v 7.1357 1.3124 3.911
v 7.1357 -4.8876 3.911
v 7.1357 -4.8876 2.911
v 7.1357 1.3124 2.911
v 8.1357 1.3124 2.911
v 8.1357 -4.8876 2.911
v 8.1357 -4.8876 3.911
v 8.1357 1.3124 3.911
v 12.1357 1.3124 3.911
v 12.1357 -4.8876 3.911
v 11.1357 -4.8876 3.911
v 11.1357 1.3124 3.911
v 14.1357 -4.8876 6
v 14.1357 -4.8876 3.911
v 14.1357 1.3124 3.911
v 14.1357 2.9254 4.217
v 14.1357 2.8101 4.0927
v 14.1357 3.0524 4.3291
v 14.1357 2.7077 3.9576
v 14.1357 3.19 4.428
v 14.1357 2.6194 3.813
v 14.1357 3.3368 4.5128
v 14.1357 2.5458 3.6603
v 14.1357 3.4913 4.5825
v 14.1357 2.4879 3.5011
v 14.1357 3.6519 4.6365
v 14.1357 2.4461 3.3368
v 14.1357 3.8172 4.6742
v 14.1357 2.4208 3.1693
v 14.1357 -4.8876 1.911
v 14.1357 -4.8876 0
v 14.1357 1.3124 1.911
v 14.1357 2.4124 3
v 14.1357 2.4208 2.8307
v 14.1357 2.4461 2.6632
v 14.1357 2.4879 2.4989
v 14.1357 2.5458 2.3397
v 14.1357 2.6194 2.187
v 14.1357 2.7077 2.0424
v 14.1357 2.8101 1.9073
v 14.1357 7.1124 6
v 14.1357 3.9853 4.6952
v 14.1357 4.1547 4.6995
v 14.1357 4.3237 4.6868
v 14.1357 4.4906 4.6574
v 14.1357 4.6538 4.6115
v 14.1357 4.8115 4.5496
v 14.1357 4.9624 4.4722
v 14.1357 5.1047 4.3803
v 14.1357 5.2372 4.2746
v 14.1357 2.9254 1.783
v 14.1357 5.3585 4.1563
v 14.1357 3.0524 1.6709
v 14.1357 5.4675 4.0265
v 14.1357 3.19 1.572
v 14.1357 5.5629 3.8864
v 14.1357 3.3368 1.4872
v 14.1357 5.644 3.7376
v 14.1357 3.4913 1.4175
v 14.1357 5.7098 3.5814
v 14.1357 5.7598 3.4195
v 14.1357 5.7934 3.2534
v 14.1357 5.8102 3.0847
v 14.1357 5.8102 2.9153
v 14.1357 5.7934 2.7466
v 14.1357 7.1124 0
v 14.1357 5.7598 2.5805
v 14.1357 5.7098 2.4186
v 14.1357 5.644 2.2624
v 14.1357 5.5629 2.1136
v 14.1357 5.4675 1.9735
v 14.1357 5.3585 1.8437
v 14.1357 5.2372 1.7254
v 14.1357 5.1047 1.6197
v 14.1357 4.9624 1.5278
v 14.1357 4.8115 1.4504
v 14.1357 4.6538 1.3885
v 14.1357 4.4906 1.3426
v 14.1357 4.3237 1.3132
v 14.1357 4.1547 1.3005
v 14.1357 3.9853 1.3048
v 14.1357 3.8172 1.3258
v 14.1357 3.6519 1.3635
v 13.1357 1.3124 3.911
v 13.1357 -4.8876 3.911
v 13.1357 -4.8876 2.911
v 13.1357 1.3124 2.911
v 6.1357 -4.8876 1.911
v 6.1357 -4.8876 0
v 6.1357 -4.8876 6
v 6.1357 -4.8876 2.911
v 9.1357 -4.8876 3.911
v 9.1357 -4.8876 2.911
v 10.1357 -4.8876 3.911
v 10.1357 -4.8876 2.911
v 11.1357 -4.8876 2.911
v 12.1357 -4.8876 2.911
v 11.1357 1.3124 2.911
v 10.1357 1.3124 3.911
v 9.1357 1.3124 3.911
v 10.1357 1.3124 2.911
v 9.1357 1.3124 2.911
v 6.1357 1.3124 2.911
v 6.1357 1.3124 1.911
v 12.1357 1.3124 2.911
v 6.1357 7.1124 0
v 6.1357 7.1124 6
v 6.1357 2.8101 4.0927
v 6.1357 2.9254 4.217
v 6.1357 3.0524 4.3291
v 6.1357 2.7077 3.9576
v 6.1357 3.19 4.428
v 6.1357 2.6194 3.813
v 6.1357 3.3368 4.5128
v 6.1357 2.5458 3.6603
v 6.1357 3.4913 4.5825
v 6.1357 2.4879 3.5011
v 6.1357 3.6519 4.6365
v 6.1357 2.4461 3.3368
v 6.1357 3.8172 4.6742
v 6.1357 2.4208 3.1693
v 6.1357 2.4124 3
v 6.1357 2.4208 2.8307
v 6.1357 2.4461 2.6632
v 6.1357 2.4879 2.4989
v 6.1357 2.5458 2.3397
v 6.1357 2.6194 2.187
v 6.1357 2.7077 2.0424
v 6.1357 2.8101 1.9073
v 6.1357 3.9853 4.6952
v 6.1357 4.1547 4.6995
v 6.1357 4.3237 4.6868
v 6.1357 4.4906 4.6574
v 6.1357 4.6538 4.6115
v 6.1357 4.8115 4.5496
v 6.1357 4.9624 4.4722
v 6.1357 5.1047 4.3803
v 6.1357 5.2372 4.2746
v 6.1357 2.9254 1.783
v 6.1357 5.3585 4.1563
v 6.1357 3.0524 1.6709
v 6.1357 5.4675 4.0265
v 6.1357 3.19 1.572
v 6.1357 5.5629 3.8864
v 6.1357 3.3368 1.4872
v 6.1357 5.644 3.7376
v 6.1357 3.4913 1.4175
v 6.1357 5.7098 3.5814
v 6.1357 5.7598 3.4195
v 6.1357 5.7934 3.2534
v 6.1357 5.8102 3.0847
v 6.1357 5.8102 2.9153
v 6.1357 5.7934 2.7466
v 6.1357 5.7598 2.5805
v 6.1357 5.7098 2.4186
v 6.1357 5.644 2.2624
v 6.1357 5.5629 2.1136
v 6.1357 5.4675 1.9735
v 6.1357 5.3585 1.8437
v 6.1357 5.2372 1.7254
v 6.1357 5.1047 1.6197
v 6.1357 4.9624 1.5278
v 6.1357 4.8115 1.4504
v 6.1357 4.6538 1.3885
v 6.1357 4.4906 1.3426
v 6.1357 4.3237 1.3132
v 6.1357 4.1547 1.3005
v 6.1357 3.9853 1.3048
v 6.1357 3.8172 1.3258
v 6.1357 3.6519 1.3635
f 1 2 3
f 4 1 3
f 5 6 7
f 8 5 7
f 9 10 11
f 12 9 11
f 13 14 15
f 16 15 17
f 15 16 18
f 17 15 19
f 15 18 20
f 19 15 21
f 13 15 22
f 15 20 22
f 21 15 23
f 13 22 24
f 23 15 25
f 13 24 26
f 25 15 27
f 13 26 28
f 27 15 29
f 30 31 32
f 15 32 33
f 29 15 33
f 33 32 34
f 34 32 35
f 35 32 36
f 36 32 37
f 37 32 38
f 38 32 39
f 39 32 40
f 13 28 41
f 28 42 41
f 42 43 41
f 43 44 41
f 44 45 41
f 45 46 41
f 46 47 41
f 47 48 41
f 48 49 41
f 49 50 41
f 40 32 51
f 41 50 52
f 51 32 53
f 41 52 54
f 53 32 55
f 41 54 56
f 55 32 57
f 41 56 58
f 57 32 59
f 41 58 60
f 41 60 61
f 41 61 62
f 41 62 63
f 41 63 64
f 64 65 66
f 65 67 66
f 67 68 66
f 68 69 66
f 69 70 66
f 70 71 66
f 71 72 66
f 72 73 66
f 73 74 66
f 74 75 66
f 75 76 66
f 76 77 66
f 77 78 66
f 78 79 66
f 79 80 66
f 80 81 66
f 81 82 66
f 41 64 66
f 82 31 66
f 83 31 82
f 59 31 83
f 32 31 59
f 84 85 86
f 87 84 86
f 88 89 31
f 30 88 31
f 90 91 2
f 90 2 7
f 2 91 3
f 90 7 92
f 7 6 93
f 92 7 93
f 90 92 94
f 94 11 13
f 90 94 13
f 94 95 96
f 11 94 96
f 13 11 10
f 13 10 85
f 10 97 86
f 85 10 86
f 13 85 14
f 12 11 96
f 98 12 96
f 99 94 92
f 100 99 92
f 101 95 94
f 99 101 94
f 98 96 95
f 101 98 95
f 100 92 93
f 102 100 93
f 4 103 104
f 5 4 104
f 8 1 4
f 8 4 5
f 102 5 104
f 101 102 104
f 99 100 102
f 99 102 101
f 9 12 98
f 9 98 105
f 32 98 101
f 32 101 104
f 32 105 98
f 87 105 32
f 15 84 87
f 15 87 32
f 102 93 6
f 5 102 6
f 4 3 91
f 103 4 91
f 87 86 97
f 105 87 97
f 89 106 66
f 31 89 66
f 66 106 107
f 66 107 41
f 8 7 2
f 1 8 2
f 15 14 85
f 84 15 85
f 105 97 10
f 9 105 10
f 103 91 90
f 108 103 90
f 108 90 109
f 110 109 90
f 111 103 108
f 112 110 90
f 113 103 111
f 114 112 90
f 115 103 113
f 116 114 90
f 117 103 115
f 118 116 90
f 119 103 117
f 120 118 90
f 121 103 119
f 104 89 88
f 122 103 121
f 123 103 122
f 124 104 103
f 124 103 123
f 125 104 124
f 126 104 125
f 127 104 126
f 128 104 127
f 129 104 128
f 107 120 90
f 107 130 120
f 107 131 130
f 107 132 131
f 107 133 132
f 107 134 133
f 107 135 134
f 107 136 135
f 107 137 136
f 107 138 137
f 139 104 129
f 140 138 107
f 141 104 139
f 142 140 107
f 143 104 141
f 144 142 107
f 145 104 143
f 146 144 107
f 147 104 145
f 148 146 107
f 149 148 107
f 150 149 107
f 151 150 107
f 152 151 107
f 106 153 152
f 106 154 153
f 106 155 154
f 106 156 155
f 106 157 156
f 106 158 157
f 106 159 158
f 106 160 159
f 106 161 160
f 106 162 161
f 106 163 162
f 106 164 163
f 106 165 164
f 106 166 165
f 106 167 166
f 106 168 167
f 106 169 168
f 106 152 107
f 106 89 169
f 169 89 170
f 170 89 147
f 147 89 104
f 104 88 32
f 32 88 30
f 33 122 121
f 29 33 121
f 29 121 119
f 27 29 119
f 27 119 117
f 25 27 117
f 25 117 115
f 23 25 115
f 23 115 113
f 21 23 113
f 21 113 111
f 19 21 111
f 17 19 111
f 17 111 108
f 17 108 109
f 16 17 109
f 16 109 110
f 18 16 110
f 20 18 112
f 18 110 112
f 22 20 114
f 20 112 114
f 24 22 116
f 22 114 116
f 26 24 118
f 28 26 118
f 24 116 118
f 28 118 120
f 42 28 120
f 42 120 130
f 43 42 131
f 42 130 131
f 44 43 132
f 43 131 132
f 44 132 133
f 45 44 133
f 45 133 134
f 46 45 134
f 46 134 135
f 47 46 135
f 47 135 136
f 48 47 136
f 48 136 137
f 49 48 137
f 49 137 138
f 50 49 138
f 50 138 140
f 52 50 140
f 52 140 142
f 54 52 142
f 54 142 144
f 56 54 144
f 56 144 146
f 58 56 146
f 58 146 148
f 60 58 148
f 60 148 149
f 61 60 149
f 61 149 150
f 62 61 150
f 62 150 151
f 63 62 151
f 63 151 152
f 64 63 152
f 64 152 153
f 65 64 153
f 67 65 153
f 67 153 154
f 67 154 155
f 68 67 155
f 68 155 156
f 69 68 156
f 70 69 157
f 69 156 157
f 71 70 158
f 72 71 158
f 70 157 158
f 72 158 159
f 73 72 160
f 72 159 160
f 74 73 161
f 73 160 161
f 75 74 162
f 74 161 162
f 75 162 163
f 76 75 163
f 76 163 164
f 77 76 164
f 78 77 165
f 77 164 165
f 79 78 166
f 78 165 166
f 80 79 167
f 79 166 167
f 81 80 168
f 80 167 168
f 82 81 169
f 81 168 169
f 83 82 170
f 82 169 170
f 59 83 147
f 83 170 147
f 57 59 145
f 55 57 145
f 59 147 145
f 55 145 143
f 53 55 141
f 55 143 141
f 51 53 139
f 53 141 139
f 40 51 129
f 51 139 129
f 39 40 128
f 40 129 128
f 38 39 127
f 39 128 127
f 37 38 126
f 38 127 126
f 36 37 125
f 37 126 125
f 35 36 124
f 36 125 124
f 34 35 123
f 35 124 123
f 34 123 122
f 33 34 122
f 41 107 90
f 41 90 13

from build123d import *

# Parameters (mm, degrees)
F0_W     = 8
F0_H     = 12
F1_DEPTH = 6
F3_DEPTH = 6.2
F4_R     = 1.7
F5_DEPTH = 25


with BuildPart() as f1:
    # F0 (on Top) → F1 (new body)
    with BuildSketch(Plane.XY):
        with Locations((10.135715, 1.112354)):
            Rectangle(F0_W, F0_H)
    extrude(amount=F1_DEPTH)

    # F2 (on face) → F3 (cut)
    with BuildSketch(Plane.XZ.offset(4.887646)):
        Polygon((6.135715, 2.910965), (6.135715, 1.910965), (14.135715, 1.910965), (14.135715, 2.910965), (14.135715, 3.910965), (13.135715, 3.910965), (13.135715, 2.910965), (12.135715, 2.910965), (12.135715, 3.910965), (11.135715, 3.910965), (11.135715, 2.910965), (10.135715, 2.910965), (10.135715, 3.910965), (9.135715, 3.910965), (9.135715, 2.910965), (8.135715, 2.910965), (8.135715, 3.910965), (7.135715, 3.910965), (7.135715, 2.910965), align=None)
    extrude(amount=-F3_DEPTH, mode=Mode.SUBTRACT)

    # F4 (on face) → F5 (cut)
    with BuildSketch(Plane(origin=(6.135715, 0, 0), x_dir=(0, -1, 0), z_dir=(-1, 0, 0))):
        with Locations((-4.112354, 3)):
            Circle(F4_R)
    extrude(amount=-F5_DEPTH, mode=Mode.SUBTRACT)


solid = f1.part
